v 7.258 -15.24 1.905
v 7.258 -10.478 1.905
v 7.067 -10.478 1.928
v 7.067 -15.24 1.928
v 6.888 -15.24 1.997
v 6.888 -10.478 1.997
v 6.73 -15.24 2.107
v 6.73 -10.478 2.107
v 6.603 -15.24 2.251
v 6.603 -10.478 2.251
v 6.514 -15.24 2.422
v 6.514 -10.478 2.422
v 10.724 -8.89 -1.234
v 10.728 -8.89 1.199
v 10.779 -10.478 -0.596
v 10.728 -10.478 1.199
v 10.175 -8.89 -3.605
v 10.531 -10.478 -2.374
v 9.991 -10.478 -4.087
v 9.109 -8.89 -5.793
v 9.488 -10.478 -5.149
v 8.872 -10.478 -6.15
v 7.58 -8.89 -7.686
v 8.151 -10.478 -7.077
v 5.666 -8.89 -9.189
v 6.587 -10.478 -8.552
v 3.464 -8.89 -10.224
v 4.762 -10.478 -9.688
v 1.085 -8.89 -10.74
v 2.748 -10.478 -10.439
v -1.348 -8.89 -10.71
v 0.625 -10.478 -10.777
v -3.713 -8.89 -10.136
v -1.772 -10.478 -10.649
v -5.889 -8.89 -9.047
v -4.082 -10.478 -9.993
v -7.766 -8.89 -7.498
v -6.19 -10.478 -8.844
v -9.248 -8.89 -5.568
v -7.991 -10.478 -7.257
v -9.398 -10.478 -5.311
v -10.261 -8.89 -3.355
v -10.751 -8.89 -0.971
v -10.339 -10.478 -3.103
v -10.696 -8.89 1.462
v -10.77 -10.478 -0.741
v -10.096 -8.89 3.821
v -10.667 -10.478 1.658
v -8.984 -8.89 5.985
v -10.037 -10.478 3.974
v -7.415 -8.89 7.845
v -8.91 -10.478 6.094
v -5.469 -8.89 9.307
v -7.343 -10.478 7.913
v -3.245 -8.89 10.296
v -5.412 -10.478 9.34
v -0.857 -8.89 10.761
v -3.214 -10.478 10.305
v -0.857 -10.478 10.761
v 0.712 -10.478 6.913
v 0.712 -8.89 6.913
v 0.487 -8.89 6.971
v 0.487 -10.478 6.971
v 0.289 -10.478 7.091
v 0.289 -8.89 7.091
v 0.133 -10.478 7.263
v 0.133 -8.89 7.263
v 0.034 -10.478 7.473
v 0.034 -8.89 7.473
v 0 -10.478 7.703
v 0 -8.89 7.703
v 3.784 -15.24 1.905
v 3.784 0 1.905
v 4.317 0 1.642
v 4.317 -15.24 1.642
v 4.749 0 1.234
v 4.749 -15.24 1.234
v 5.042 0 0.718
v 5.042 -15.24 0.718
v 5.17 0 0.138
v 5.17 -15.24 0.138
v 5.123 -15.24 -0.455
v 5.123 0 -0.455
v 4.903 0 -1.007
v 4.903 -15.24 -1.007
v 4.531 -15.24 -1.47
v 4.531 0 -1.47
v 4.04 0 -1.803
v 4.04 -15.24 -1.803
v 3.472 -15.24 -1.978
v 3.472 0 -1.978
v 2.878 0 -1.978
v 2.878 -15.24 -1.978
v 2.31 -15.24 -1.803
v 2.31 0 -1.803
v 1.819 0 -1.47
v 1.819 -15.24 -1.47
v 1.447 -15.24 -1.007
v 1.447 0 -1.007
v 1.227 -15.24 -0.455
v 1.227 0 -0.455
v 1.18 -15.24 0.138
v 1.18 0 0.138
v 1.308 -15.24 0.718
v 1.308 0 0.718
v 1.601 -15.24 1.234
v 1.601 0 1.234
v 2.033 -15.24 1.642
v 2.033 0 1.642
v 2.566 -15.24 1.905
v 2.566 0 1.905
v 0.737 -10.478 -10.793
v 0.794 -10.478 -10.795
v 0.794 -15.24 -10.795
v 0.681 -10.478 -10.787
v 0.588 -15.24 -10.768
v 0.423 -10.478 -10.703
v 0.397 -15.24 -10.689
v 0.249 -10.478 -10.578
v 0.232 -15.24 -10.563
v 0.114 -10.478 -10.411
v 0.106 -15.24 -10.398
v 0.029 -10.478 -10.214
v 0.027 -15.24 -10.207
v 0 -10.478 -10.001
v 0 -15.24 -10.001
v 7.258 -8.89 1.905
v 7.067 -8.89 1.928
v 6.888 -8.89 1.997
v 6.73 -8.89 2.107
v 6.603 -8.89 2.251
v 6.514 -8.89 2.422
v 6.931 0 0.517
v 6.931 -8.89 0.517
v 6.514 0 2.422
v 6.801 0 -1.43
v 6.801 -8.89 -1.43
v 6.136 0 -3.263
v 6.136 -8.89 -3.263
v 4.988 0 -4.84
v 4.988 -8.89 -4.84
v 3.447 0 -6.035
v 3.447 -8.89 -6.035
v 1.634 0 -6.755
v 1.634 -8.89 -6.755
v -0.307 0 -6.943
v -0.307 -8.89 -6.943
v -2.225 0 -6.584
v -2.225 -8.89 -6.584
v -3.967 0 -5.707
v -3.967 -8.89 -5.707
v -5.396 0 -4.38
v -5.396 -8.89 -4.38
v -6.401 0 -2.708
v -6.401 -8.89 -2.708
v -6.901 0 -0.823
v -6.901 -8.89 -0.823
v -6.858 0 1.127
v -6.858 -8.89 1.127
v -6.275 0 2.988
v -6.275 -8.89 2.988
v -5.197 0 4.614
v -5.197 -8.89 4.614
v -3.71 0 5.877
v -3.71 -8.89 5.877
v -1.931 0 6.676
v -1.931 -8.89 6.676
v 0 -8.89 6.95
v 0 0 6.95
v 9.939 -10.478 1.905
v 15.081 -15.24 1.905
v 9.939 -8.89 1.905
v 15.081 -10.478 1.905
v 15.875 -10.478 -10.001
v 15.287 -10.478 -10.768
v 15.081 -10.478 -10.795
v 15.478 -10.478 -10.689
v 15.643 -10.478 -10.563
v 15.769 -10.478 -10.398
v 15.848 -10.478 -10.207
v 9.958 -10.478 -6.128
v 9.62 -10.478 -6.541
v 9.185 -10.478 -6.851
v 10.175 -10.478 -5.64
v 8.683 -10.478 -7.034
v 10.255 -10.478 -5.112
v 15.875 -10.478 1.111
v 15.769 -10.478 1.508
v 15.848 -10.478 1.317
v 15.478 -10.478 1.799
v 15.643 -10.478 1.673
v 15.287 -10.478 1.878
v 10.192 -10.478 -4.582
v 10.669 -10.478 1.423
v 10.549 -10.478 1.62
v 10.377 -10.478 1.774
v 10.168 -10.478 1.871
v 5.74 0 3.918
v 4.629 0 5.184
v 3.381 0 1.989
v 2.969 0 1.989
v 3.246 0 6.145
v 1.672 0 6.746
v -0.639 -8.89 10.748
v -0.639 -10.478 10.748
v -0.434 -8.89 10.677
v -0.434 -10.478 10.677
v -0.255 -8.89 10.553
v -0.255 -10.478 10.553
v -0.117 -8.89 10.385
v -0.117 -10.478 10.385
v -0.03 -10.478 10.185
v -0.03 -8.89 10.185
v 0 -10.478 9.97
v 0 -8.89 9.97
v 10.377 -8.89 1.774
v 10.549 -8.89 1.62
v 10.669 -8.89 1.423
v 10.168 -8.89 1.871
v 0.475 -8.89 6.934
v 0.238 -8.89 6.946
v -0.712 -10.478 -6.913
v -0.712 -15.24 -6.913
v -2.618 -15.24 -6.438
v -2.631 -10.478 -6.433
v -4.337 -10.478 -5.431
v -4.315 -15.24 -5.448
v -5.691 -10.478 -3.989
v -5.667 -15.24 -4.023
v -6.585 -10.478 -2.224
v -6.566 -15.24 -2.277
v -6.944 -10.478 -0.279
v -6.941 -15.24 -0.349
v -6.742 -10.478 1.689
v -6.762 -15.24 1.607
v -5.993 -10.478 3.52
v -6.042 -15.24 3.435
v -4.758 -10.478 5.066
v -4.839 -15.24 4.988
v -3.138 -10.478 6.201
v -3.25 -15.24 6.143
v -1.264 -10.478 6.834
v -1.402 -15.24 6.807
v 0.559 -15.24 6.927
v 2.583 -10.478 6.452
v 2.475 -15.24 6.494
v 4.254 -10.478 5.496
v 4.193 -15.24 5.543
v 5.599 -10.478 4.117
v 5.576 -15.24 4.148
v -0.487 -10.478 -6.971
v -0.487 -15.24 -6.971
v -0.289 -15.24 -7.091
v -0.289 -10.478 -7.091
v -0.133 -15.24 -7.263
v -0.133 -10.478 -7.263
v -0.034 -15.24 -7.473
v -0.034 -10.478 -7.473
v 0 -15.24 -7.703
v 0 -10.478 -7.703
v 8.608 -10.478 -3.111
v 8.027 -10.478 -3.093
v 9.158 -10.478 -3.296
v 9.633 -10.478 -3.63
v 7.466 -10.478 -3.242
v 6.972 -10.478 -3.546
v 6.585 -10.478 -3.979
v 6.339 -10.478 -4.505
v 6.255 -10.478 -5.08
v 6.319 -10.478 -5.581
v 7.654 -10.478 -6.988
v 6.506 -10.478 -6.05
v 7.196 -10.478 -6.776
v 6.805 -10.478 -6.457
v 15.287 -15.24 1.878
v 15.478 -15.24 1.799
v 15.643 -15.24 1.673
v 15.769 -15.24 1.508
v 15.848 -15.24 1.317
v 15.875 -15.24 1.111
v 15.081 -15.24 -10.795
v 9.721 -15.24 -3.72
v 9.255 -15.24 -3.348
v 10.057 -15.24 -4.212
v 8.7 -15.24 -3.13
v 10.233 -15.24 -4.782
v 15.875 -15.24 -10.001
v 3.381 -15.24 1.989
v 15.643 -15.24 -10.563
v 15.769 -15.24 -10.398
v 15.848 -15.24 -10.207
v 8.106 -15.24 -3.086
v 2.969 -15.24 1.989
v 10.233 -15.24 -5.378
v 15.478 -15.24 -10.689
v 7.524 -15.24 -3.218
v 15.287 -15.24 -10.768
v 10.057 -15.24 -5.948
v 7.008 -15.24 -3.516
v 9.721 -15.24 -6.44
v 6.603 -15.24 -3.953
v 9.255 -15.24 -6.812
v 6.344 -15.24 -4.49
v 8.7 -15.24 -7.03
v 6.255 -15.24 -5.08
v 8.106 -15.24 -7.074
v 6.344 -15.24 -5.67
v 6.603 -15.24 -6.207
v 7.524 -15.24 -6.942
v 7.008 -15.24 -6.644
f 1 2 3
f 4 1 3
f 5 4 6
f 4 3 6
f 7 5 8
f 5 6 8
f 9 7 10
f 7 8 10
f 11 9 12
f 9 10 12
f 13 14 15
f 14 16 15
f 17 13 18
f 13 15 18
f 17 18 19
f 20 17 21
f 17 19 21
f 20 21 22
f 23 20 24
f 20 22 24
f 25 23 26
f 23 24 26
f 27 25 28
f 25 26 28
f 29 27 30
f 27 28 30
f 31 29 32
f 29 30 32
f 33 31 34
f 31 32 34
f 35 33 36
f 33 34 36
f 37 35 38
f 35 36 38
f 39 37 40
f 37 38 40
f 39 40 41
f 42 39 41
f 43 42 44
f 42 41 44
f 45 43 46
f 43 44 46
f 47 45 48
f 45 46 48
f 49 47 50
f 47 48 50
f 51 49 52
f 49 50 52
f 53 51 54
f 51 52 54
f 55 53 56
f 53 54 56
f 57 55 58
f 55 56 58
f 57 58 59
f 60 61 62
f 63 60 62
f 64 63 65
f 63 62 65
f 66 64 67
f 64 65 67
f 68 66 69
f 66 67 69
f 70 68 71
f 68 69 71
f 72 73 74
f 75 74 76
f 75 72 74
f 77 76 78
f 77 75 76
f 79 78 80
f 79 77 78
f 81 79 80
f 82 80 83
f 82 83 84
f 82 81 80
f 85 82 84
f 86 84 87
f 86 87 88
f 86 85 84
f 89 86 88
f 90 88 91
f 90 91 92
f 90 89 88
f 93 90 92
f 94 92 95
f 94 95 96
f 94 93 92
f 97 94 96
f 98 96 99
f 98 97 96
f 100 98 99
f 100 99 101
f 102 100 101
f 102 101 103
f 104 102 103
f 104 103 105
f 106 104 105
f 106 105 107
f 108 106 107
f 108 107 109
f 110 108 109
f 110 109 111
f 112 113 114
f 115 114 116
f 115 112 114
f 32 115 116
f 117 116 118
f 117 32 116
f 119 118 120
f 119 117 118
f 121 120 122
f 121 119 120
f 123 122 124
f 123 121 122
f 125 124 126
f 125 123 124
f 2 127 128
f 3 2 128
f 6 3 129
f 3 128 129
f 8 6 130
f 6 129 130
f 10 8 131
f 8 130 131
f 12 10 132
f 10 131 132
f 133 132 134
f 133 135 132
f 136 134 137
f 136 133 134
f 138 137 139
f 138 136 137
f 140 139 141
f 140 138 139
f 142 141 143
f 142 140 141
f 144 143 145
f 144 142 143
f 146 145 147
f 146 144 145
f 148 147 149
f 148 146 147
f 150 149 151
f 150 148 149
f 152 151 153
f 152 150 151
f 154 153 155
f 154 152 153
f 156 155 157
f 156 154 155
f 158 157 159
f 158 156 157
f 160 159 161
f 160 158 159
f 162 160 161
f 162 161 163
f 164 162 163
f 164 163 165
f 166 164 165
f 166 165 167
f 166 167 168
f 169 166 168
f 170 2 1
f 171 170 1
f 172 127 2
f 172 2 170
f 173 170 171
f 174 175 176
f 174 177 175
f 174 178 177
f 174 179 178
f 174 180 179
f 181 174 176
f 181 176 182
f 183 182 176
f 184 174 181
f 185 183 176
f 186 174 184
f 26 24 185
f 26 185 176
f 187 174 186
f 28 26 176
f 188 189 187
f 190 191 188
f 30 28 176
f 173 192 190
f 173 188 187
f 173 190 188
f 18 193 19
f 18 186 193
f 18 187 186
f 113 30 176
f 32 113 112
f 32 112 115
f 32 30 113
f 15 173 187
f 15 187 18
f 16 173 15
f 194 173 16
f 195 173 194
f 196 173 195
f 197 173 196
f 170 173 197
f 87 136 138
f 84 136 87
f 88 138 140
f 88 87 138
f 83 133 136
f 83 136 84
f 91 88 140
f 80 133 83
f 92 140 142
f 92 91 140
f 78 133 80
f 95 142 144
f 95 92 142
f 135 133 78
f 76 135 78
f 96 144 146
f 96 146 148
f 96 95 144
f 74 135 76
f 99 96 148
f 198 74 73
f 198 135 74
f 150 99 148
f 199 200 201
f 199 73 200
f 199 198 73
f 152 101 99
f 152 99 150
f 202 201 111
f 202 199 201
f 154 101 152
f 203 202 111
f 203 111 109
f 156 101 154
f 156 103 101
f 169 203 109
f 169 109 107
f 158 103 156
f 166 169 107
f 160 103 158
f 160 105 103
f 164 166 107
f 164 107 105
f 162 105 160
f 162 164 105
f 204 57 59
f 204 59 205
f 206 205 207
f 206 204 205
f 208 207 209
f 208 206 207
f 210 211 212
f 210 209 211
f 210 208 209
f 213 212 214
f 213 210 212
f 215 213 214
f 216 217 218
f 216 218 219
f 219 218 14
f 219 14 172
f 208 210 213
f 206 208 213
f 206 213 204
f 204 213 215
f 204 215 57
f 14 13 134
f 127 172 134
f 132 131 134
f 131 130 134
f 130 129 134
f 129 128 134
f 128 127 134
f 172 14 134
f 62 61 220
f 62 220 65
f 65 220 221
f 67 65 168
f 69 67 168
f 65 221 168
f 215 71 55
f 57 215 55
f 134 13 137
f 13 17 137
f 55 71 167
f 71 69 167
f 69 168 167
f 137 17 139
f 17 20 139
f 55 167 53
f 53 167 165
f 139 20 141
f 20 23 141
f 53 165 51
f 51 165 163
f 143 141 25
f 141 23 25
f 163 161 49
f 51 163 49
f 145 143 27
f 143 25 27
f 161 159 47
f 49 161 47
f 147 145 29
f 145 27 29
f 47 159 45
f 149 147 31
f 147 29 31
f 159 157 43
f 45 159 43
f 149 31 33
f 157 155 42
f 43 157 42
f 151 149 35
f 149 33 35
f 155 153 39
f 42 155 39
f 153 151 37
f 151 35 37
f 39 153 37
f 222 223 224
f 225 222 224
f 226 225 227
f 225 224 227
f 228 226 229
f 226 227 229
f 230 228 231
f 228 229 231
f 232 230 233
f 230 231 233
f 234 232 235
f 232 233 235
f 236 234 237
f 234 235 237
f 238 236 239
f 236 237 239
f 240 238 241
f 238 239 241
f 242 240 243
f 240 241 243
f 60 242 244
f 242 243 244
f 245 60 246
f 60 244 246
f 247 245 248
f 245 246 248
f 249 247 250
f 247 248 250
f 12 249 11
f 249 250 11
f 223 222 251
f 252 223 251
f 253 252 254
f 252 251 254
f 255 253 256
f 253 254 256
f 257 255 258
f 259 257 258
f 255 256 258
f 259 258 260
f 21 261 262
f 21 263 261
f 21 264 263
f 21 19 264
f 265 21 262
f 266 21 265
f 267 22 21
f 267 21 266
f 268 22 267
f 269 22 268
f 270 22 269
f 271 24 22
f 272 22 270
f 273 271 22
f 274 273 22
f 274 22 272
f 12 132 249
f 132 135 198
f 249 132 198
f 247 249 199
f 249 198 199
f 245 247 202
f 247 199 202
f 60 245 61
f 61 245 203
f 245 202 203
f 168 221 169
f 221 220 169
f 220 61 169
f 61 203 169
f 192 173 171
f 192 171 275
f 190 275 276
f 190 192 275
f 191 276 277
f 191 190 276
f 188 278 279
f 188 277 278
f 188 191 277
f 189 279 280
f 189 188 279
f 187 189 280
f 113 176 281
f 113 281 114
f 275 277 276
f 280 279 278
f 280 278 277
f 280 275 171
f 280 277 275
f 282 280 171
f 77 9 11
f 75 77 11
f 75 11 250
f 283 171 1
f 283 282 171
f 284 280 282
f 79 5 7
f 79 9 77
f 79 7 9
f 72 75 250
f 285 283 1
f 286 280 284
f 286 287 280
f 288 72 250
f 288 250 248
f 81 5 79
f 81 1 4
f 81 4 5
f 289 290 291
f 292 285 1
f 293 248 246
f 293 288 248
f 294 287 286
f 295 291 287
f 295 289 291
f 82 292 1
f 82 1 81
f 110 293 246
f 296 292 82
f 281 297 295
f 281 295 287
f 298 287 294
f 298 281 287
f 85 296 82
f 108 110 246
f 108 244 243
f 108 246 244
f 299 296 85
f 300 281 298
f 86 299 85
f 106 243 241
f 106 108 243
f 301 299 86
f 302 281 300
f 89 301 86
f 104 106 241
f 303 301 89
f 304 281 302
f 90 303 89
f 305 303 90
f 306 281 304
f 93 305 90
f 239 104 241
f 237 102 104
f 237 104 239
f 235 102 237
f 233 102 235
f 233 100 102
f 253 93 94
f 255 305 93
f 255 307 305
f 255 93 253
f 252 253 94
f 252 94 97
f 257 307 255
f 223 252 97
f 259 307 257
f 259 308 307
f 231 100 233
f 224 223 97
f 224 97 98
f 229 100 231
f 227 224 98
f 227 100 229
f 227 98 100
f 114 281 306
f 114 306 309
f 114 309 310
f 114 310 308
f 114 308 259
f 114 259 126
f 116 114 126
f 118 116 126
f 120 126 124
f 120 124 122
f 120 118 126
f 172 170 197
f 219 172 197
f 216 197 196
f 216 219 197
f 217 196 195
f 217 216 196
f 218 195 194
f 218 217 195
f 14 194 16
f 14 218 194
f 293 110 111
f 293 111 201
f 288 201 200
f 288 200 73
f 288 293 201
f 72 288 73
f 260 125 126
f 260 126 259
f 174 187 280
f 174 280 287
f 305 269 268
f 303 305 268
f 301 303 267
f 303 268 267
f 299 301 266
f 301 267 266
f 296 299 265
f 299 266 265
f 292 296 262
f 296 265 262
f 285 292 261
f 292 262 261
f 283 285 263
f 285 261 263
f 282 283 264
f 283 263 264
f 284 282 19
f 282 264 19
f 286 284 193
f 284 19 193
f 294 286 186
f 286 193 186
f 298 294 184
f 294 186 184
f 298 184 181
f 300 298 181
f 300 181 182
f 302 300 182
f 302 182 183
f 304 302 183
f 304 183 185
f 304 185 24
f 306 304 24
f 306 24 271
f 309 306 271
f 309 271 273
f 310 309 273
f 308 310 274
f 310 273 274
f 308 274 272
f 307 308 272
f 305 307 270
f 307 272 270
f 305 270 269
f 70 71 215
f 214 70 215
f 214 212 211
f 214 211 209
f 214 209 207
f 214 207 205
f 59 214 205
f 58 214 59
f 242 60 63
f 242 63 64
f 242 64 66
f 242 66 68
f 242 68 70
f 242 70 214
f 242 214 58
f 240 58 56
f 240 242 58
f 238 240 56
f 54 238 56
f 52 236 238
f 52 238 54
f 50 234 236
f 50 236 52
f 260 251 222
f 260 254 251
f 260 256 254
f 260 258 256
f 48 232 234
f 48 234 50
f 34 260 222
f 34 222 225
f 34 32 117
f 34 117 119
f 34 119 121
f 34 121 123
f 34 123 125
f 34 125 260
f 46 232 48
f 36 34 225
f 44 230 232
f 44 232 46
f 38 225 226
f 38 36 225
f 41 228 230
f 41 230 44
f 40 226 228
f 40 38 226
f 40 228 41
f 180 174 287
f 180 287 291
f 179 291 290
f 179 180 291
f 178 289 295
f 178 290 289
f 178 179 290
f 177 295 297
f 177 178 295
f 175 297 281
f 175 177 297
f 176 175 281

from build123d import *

# Parameters (mm, degrees)
SKETCH2_W           = 4.7625
SKETCH2_H           = 6.95
SKETCH2_W_2         = 1.5875
SKETCH2_H_2         = 3.845
SKETCH2_W_3         = 17.78
SKETCH3_R           = 11.338051479
CUT_EXTRUDE1_DEPTH  = 21.336
SKETCH5_R           = 2
CUT_EXTRUDE3_DEPTH  = 27.432
BOSS_EXTRUDE2_START = -4.7625
SKETCH5_3_R         = 2
BOSS_EXTRUDE2_DEPTH = 4.7625
FILLET1_R           = 0.79375
CUT_EXTRUDE4_START  = -14.224
CUT_EXTRUDE4_DEPTH  = 14.224
FILLET2_R           = 0.79375


with BuildPart() as part:
    # Sketch2 → Revolve2 (revolve)
    with BuildSketch(Plane(origin=(0, 0, 0), x_dir=(0, 1, 0), z_dir=(0, 0, 1)), mode=Mode.PRIVATE) as revolve2_sk:
        with Locations((-12.85875, 3.475)):
            Rectangle(SKETCH2_W, SKETCH2_H)
        with Locations((-9.68375, 3.475)):
            Rectangle(SKETCH2_W_2, SKETCH2_H)
        with Locations((-9.68375, 8.8725)):
            Rectangle(SKETCH2_W_2, SKETCH2_H_2)
        with Locations((0, 3.475)):
            Rectangle(SKETCH2_W_3, SKETCH2_H)
        with Locations((9.68375, 3.475)):
            Rectangle(SKETCH2_W_2, SKETCH2_H)
        with Locations((9.68375, 8.8725)):
            Rectangle(SKETCH2_W_2, SKETCH2_H_2)
        with Locations((12.85875, 3.475)):
            Rectangle(SKETCH2_W, SKETCH2_H)
    revolve(revolve2_sk.sketch.rotate(Axis((0, -15.24, 0), (0, 1, 0)), 180), axis=Axis((0, -15.24, 0), (0, 1, 0)))

    # Sketch3 → Cut-Extrude1 (cut)
    with BuildSketch(Plane(origin=(0, 0, 0), x_dir=(-1, 0, 0), z_dir=(0, 1, 0))):
        Circle(SKETCH3_R)
    extrude(amount=-CUT_EXTRUDE1_DEPTH, mode=Mode.SUBTRACT)

    # Sketch5 → Cut-Extrude3 (cut)
    with BuildSketch(Plane(origin=(0, 15.24, 0), x_dir=(-1, 0, 0), z_dir=(0, 1, 0))):
        with Locations((-3.175, 0)):
            Circle(SKETCH5_R)
        with BuildLine():
            ThreePointArc((-1.175, 0), (-1.559736192, 1.179373914), (-2.565922829, 1.905))
            Line((-2.565922829, 1.905), (-3.784077171, 1.905))
            ThreePointArc((-3.784077171, 1.905), (-4.354373914, -1.615263808), (-1.175, 0))
        make_face()
        with BuildLine():
            Line((-3.784077171, 1.905), (-2.565922829, 1.905))
            ThreePointArc((-2.565922829, 1.905), (-3.175, 2), (-3.784077171, 1.905))
        make_face()
    extrude(amount=-CUT_EXTRUDE3_DEPTH, mode=Mode.SUBTRACT)

    # Sketch5<3> → Boss-Extrude2 (add)
    with BuildSketch(Plane(origin=(0, 15.24, 0), x_dir=(-1, 0, 0), z_dir=(0, 1, 0)).offset(BOSS_EXTRUDE2_START)):
        with BuildLine():
            Line((-15.875, -10.795), (0, -10.795))
            Line((0, -10.795), (0, -6.95))
            ThreePointArc((0, -6.95), (-5.547172703, -4.187048483), (-6.683821886, 1.905))
            Line((-6.683821886, 1.905), (-15.875, 1.905))
            Line((-15.875, 1.905), (-15.875, -10.795))
        make_face()
        with Locations((-8.255, -5.08)):
            Circle(SKETCH5_3_R, mode=Mode.SUBTRACT)
    extrude(amount=BOSS_EXTRUDE2_DEPTH)

    # Fillet1
    # the kernel refuses this fillet: 0.79375 mm, written as the material it adds along each edge
    with BuildSketch(Plane(origin=(0, 10.4775, -6.95), x_dir=(-0.9986823309895368, 0, 0.051318629846335534), z_dir=(0, 1, 0))) as fillet1_piece_1:
        with BuildLine():
            CenterArc((0.754063117, -0.7927041), FILLET1_R, 92.941633047, 84.116733906)
            Line((-0.038640983, -0.751969938), (0, 0))
            ThreePointArc((0, 0), (0.356664477, -0.0091578), (0.713328955, 0))
        make_face()
    extrude(amount=4.7625)
    with BuildSketch(Plane(origin=(6.683821886, 9.041391923, 1.905), x_dir=(1, 0, 0), z_dir=(0, 1, 0))) as fillet1_piece_2:
        with BuildLine():
            CenterArc((0.574443231, -0.79375), FILLET1_R, 90, 69.603984808)
            ThreePointArc((-0.169543589, -0.51712268), (-0.079708314, -0.26022145), (0, 0))
            Line((0, 0), (0.574443231, 0))
        make_face()
    extrude(amount=6.198608077)
    # the kernel refuses this fillet: 0.79375 mm, written as the material it takes off along each edge
    with BuildSketch(Plane(origin=(0, 10.4775, -10.795), x_dir=(1, 0, 0), z_dir=(0, 1, 0))) as fillet1_2_piece_1:
        with BuildLine():
            CenterArc((FILLET1_R, -FILLET1_R), FILLET1_R, 90, 90)
            Line((0, -FILLET1_R), (0, 0))
            Line((0, 0), (FILLET1_R, 0))
        make_face()
    extrude(amount=6.746875, mode=Mode.SUBTRACT)
    with BuildSketch(Plane(origin=(15.875, 8.493125, 1.905), x_dir=(0, 0, -1), z_dir=(0, 1, 0)), Plane(origin=(15.875, 8.493125, -10.795), x_dir=(-1, 0, 0), z_dir=(0, 1, 0))) as fillet1_2_piece_2:
        with BuildLine():
            CenterArc((FILLET1_R, FILLET1_R), FILLET1_R, 180, 90)
            Line((0, FILLET1_R), (0, 0))
            Line((0, 0), (FILLET1_R, 0))
        make_face()
    extrude(amount=8.73125, mode=Mode.SUBTRACT)

    # Sketch6 → Cut-Extrude4 (cut)
    with BuildSketch(Plane(origin=(0, 10.4775, 0), x_dir=(-1, 0, 0), z_dir=(0, 1, 0)).offset(CUT_EXTRUDE4_START)):
        with BuildLine():
            ThreePointArc((-6.514278297, 2.42212268), (-3.966657748, 5.70684907), (0, 6.95))
            Line((0, 6.95), (0, 10.795))
            ThreePointArc((0, 10.795), (-6.927032193, 8.279387055), (-10.625582337, 1.905))
            Line((-10.625582337, 1.905), (-7.258265116, 1.905))
            ThreePointArc((-7.258265116, 1.905), (-6.805238557, 2.046978568), (-6.514278297, 2.42212268))
        make_face()
    extrude(amount=CUT_EXTRUDE4_DEPTH, mode=Mode.SUBTRACT)

    # Fillet2
    # the kernel refuses this fillet: 0.79375 mm, written as the material it adds along each edge
    with BuildSketch(Plane(origin=(0, 8.89, 6.95), x_dir=(0.9986823309895368, 0, -0.051318629846333855), z_dir=(0, 1, 0))) as fillet2_piece_1:
        with BuildLine():
            CenterArc((0.754063117, -0.7927041), FILLET2_R, 92.941633047, 84.116733906)
            Line((-0.038640983, -0.751969938), (0, 0))
            ThreePointArc((0, 0), (0.356664477, -0.0091578), (0.713328955, 0))
        make_face()
    extrude(amount=1.5875)
    # the kernel refuses this fillet: 0.79375 mm, written as the material it takes off along each edge
    with BuildSketch(Plane(origin=(0, 6.746443854, 10.795), x_dir=(0, 0, -1), z_dir=(0, 1, 0))) as fillet2_2_piece_1:
        with BuildLine():
            CenterArc((0.825297773, 0.79375), FILLET2_R, 175.447928579, 94.552071421)
            ThreePointArc((0.034051564, 0.856746032), (0.00851625, 0.428711229), (0, 0))
            Line((0, 0), (0.825297773, 0))
        make_face()
    extrude(amount=5.874612291, mode=Mode.SUBTRACT)
    with BuildSketch(Plane(origin=(10.625582337, 7.107567927, 1.905), x_dir=(-1, 0, 0), z_dir=(0, 1, 0))) as fillet2_2_piece_2:
        with BuildLine():
            CenterArc((0.686260177, -0.79375), FILLET2_R, 90, 83.620629792)
            ThreePointArc((-0.102574915, -0.705555556), (-0.057113988, -0.351930706), (0, 0))
            Line((0, 0), (0.686260177, 0))
        make_face()
    extrude(amount=3.369932073, mode=Mode.SUBTRACT)


with BuildPart() as body_2:
    # Mirror1: mirrored copy
    add(part.part.mirror(Plane.ZX))


solid = body_2.part
